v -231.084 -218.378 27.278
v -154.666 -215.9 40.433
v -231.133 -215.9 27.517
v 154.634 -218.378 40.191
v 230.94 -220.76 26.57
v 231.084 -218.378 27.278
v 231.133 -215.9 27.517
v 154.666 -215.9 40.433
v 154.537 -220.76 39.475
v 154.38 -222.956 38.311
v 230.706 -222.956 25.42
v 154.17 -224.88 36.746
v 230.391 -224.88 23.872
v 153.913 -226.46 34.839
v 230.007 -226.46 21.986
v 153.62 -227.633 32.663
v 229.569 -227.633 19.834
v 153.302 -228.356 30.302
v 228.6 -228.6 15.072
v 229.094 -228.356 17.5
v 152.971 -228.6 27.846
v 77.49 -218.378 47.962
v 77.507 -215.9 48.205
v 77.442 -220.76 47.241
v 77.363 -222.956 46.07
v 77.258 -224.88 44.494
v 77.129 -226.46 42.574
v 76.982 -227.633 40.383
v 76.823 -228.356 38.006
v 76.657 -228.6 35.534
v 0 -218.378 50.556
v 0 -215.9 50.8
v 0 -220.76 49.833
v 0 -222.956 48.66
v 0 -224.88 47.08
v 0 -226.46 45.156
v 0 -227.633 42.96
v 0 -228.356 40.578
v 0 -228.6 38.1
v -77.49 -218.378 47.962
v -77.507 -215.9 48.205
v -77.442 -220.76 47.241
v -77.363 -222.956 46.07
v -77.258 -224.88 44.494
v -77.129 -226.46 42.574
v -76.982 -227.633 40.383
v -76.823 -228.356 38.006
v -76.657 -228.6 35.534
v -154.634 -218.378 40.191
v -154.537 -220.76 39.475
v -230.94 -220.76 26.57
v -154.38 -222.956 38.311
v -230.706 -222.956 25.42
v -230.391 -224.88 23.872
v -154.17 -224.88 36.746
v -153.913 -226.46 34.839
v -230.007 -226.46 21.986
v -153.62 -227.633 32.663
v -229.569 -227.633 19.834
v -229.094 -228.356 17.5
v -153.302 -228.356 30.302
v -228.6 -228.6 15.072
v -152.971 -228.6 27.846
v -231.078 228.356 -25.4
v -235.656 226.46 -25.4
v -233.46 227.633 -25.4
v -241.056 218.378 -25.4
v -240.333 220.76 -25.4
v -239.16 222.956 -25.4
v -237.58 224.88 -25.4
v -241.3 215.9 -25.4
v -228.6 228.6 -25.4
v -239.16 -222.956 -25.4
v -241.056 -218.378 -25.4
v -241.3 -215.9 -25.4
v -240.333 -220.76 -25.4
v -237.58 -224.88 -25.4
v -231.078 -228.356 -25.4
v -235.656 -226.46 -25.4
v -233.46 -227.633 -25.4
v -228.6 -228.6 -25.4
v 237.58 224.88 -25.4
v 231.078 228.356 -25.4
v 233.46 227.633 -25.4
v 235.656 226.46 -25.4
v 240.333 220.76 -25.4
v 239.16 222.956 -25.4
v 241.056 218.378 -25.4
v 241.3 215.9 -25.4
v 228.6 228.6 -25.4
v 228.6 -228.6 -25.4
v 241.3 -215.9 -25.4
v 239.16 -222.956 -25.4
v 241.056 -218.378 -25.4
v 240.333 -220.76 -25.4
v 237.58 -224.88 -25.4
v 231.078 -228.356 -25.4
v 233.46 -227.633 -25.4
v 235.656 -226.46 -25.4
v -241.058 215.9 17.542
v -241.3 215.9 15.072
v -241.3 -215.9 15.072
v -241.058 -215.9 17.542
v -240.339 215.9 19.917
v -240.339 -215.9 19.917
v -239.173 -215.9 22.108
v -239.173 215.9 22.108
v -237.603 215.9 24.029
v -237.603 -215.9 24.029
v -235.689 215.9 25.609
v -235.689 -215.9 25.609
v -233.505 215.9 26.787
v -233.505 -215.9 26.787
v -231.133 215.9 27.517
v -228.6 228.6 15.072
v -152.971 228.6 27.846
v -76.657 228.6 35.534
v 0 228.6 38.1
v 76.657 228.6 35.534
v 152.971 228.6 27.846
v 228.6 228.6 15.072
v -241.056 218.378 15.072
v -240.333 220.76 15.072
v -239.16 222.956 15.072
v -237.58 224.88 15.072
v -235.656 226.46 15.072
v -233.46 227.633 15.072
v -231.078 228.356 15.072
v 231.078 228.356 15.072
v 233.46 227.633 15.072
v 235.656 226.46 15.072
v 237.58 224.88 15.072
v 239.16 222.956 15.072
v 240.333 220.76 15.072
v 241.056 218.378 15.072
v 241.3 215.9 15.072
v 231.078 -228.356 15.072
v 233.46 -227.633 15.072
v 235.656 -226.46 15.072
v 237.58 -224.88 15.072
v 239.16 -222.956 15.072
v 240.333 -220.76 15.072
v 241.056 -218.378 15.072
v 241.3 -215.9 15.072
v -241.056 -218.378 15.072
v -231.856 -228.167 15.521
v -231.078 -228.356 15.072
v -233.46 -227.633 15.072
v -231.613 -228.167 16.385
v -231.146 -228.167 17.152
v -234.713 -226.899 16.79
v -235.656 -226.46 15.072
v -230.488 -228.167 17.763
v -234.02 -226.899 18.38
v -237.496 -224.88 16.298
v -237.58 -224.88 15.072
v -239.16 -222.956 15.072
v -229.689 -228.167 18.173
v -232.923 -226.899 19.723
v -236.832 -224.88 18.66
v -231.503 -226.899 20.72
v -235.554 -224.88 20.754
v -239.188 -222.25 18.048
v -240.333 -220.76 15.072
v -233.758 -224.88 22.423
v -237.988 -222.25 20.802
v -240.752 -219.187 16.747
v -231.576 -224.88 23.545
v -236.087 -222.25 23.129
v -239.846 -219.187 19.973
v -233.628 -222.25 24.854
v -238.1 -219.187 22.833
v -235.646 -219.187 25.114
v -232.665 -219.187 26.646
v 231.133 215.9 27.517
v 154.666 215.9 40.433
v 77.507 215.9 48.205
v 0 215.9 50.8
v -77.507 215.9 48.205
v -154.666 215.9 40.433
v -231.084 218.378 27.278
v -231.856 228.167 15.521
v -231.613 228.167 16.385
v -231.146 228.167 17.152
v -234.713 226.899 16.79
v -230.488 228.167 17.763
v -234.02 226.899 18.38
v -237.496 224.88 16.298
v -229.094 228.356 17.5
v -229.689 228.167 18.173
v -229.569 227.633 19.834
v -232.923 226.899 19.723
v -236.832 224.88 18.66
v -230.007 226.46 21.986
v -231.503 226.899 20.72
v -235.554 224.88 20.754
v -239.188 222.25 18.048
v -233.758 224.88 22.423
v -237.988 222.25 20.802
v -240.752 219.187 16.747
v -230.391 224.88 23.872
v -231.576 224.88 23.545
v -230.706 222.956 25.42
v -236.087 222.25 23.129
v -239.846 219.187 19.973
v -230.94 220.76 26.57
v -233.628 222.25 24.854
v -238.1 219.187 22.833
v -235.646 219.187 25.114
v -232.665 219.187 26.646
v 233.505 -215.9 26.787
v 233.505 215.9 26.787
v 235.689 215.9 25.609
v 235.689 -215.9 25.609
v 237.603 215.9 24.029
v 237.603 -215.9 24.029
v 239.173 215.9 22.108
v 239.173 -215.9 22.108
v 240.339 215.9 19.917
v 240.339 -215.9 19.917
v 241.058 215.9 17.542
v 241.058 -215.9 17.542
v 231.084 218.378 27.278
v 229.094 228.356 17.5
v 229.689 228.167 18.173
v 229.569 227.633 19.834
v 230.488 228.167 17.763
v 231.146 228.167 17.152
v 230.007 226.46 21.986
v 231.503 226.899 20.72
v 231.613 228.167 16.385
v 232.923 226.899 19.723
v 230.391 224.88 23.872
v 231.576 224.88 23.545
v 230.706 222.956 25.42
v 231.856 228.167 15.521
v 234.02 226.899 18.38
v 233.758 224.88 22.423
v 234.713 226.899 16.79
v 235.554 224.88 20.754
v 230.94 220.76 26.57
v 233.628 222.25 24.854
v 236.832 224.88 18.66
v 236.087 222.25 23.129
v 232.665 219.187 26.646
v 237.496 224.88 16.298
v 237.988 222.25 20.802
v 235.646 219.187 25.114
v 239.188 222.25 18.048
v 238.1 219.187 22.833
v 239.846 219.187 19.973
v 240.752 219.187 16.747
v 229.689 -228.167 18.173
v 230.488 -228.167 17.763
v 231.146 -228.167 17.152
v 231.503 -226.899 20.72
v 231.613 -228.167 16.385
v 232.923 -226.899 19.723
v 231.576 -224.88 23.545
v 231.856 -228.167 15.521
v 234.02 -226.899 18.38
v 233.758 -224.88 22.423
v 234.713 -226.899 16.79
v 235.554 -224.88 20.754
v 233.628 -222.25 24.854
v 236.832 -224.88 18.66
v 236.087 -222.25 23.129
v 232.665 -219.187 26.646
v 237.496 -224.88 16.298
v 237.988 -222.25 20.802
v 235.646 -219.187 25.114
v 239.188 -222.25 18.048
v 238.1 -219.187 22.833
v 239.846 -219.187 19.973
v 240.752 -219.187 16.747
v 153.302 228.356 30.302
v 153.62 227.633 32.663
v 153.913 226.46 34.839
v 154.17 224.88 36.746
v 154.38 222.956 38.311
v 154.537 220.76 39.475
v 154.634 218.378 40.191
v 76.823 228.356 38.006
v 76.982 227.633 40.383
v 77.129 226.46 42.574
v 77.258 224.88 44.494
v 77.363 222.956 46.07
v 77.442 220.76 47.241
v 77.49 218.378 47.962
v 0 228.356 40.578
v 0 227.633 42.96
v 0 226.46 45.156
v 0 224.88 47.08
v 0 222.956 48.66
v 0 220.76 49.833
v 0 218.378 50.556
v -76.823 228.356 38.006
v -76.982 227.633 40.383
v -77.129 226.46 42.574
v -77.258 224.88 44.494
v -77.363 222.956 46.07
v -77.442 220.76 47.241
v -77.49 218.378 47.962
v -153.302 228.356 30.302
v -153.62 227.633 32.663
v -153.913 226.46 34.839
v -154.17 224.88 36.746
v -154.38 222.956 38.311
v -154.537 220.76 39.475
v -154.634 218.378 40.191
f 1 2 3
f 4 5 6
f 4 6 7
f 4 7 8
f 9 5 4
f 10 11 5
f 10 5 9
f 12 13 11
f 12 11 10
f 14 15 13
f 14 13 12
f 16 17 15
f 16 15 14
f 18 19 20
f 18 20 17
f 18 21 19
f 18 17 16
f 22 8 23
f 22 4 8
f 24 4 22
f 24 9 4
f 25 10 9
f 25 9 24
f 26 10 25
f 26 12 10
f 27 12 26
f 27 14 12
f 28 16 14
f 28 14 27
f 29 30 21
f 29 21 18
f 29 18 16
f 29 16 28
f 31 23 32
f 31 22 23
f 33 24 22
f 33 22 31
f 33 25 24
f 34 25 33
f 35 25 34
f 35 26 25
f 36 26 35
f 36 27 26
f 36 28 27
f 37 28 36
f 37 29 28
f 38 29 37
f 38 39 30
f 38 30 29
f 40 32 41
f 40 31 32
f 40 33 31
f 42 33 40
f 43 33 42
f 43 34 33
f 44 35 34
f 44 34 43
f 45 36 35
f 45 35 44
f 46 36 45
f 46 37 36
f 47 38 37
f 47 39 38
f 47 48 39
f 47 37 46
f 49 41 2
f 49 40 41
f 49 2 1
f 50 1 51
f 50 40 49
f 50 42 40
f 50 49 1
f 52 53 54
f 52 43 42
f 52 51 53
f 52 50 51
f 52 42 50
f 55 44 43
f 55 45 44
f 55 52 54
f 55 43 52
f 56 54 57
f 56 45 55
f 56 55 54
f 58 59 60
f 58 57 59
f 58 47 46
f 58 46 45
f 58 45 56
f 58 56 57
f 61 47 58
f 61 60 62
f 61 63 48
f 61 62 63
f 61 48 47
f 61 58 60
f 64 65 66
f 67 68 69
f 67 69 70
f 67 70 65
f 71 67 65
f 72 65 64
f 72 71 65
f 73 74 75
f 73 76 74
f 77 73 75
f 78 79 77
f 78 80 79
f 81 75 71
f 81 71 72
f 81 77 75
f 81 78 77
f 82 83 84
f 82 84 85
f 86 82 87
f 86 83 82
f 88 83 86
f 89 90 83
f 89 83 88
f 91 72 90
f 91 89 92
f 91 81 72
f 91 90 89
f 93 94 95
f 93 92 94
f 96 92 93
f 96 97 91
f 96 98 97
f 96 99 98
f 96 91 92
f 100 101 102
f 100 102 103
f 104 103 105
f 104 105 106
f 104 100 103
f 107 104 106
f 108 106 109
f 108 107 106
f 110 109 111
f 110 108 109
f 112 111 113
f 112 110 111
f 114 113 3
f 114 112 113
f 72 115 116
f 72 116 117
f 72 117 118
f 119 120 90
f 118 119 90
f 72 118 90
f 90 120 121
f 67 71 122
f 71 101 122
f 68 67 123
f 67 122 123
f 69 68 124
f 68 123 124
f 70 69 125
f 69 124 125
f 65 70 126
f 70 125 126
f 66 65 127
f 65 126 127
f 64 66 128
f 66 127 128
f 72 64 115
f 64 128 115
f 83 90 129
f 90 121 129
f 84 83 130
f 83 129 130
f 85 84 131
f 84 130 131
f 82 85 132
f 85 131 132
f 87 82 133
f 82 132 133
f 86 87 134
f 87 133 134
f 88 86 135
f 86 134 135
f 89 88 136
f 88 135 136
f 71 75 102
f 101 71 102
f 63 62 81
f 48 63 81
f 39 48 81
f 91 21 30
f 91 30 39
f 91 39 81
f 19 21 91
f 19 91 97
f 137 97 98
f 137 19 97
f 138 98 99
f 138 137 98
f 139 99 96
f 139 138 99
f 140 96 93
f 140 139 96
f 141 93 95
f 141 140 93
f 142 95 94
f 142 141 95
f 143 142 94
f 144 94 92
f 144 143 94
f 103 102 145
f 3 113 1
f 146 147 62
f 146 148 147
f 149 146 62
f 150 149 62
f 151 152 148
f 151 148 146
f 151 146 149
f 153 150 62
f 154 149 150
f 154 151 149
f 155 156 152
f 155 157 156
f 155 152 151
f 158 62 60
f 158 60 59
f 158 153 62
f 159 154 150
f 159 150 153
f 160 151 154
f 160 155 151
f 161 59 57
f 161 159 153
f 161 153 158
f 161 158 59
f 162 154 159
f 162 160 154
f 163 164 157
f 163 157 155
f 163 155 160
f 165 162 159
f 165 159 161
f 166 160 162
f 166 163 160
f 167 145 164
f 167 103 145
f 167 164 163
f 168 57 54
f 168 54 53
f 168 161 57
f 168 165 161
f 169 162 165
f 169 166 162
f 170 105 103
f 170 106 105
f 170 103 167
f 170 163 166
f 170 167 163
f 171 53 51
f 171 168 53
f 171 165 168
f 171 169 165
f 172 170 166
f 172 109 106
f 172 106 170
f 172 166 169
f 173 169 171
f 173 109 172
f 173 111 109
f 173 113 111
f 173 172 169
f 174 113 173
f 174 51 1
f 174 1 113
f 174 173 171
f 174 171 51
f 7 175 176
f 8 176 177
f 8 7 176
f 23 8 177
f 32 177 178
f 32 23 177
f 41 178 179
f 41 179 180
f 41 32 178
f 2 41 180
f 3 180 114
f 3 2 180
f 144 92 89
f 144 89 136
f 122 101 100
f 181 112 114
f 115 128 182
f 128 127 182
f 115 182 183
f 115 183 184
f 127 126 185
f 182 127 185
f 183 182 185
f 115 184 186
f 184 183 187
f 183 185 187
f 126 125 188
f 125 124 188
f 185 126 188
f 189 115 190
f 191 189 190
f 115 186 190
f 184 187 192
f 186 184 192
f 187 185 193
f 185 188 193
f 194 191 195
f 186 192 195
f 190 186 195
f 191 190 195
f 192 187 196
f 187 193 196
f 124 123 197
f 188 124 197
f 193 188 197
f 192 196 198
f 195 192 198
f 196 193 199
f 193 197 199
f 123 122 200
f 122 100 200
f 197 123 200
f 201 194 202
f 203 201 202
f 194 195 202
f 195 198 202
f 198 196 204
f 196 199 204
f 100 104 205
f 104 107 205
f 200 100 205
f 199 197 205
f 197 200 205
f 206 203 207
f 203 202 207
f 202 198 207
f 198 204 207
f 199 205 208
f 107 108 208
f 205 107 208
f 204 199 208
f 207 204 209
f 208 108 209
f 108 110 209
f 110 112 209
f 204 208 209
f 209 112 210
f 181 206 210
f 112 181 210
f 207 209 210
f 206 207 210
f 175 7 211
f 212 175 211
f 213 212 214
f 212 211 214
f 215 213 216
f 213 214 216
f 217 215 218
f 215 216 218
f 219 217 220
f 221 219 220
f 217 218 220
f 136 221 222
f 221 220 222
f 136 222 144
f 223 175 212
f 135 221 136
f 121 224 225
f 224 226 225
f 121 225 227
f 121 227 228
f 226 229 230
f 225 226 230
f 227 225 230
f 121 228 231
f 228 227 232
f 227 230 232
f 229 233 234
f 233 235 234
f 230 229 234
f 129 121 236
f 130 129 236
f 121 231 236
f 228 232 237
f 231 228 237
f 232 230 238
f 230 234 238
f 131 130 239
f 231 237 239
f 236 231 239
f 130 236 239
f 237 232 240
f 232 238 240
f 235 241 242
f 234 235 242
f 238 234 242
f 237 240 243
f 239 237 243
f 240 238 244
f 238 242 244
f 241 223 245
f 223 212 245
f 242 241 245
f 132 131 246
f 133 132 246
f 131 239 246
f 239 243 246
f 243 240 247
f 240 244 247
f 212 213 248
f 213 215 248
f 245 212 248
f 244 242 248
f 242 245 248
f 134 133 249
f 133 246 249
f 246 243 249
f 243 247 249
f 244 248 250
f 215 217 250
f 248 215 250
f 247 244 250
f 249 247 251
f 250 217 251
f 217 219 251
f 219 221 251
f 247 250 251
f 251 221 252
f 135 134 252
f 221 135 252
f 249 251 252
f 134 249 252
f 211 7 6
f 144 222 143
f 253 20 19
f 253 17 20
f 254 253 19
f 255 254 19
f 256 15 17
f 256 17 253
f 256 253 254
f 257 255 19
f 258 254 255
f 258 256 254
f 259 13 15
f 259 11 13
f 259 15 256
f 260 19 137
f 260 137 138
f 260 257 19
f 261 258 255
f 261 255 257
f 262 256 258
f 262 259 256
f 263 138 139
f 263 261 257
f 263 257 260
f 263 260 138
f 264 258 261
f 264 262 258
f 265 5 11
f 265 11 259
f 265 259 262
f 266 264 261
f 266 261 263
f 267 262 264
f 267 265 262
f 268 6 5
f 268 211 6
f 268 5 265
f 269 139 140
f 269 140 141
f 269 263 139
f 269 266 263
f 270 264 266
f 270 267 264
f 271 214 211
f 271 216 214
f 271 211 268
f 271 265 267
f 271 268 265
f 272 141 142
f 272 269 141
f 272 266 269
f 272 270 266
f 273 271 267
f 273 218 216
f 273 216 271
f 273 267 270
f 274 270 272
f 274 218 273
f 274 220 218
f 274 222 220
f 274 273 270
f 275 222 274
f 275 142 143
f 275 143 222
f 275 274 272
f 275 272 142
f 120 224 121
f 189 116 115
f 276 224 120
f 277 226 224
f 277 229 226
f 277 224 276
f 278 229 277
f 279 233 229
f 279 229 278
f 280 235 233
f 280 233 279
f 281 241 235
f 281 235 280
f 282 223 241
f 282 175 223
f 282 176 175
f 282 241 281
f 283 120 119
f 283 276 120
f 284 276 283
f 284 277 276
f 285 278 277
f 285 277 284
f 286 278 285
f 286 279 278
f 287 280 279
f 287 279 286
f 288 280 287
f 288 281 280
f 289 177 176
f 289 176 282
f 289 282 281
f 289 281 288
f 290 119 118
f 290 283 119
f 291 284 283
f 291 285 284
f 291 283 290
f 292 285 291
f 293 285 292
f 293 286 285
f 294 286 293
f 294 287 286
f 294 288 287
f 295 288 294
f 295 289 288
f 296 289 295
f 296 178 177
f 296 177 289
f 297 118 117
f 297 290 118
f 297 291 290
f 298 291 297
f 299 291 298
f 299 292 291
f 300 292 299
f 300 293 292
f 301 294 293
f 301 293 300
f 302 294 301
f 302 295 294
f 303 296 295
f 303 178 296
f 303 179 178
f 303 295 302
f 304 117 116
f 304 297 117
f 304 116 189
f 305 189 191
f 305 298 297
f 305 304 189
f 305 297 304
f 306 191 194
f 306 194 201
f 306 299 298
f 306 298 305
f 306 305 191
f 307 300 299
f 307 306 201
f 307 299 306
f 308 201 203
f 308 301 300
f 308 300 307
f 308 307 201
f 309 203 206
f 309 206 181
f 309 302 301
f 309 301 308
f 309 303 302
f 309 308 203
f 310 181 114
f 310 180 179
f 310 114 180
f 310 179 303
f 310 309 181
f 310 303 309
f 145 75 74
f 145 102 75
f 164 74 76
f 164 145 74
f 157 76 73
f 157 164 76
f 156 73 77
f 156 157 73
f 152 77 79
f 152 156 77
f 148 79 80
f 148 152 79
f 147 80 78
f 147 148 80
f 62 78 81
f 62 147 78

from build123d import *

# Parameters (mm, degrees)
F1_DEPTH = 228.6
F0_W     = 482.6
F0_H     = 50.8
F2_DEPTH = 228.6
F3_R     = 12.7


with BuildPart() as f1:
    # F0 (on Front) → F1 (new body, symmetric)
    with BuildSketch(Plane.XZ):
        with BuildLine():
            Line((-241.3, 25.4), (241.3, 25.4))
            ThreePointArc((241.3, 25.4), (0, 50.8), (-241.3, 25.4))
        make_face()
    extrude(amount=F1_DEPTH, both=True)

    # F0 (on Front) → F2 (join, symmetric)
    with BuildSketch(Plane.XZ):
        Rectangle(F0_W, F0_H)
        with BuildLine():
            Line((-241.3, 25.4), (241.3, 25.4))
            ThreePointArc((241.3, 25.4), (0, 50.8), (-241.3, 25.4))
        make_face()
    extrude(amount=F2_DEPTH, both=True)

    # F3
    f3_edges = [f1.edges().sort_by_distance(p)[0] for p in [
        (-241.3, 228.6, 0),
        (-241.3, -228.6, 0),
        (241.3, 228.6, 0),
        (241.3, -228.6, 0),
        (241.3, 0, 25.4),
        (0, -228.6, 50.8),
        (0, 228.6, 50.8),
        (-241.3, 0, 25.4),
    ]]
    fillet(f3_edges, radius=F3_R)


solid = f1.part
